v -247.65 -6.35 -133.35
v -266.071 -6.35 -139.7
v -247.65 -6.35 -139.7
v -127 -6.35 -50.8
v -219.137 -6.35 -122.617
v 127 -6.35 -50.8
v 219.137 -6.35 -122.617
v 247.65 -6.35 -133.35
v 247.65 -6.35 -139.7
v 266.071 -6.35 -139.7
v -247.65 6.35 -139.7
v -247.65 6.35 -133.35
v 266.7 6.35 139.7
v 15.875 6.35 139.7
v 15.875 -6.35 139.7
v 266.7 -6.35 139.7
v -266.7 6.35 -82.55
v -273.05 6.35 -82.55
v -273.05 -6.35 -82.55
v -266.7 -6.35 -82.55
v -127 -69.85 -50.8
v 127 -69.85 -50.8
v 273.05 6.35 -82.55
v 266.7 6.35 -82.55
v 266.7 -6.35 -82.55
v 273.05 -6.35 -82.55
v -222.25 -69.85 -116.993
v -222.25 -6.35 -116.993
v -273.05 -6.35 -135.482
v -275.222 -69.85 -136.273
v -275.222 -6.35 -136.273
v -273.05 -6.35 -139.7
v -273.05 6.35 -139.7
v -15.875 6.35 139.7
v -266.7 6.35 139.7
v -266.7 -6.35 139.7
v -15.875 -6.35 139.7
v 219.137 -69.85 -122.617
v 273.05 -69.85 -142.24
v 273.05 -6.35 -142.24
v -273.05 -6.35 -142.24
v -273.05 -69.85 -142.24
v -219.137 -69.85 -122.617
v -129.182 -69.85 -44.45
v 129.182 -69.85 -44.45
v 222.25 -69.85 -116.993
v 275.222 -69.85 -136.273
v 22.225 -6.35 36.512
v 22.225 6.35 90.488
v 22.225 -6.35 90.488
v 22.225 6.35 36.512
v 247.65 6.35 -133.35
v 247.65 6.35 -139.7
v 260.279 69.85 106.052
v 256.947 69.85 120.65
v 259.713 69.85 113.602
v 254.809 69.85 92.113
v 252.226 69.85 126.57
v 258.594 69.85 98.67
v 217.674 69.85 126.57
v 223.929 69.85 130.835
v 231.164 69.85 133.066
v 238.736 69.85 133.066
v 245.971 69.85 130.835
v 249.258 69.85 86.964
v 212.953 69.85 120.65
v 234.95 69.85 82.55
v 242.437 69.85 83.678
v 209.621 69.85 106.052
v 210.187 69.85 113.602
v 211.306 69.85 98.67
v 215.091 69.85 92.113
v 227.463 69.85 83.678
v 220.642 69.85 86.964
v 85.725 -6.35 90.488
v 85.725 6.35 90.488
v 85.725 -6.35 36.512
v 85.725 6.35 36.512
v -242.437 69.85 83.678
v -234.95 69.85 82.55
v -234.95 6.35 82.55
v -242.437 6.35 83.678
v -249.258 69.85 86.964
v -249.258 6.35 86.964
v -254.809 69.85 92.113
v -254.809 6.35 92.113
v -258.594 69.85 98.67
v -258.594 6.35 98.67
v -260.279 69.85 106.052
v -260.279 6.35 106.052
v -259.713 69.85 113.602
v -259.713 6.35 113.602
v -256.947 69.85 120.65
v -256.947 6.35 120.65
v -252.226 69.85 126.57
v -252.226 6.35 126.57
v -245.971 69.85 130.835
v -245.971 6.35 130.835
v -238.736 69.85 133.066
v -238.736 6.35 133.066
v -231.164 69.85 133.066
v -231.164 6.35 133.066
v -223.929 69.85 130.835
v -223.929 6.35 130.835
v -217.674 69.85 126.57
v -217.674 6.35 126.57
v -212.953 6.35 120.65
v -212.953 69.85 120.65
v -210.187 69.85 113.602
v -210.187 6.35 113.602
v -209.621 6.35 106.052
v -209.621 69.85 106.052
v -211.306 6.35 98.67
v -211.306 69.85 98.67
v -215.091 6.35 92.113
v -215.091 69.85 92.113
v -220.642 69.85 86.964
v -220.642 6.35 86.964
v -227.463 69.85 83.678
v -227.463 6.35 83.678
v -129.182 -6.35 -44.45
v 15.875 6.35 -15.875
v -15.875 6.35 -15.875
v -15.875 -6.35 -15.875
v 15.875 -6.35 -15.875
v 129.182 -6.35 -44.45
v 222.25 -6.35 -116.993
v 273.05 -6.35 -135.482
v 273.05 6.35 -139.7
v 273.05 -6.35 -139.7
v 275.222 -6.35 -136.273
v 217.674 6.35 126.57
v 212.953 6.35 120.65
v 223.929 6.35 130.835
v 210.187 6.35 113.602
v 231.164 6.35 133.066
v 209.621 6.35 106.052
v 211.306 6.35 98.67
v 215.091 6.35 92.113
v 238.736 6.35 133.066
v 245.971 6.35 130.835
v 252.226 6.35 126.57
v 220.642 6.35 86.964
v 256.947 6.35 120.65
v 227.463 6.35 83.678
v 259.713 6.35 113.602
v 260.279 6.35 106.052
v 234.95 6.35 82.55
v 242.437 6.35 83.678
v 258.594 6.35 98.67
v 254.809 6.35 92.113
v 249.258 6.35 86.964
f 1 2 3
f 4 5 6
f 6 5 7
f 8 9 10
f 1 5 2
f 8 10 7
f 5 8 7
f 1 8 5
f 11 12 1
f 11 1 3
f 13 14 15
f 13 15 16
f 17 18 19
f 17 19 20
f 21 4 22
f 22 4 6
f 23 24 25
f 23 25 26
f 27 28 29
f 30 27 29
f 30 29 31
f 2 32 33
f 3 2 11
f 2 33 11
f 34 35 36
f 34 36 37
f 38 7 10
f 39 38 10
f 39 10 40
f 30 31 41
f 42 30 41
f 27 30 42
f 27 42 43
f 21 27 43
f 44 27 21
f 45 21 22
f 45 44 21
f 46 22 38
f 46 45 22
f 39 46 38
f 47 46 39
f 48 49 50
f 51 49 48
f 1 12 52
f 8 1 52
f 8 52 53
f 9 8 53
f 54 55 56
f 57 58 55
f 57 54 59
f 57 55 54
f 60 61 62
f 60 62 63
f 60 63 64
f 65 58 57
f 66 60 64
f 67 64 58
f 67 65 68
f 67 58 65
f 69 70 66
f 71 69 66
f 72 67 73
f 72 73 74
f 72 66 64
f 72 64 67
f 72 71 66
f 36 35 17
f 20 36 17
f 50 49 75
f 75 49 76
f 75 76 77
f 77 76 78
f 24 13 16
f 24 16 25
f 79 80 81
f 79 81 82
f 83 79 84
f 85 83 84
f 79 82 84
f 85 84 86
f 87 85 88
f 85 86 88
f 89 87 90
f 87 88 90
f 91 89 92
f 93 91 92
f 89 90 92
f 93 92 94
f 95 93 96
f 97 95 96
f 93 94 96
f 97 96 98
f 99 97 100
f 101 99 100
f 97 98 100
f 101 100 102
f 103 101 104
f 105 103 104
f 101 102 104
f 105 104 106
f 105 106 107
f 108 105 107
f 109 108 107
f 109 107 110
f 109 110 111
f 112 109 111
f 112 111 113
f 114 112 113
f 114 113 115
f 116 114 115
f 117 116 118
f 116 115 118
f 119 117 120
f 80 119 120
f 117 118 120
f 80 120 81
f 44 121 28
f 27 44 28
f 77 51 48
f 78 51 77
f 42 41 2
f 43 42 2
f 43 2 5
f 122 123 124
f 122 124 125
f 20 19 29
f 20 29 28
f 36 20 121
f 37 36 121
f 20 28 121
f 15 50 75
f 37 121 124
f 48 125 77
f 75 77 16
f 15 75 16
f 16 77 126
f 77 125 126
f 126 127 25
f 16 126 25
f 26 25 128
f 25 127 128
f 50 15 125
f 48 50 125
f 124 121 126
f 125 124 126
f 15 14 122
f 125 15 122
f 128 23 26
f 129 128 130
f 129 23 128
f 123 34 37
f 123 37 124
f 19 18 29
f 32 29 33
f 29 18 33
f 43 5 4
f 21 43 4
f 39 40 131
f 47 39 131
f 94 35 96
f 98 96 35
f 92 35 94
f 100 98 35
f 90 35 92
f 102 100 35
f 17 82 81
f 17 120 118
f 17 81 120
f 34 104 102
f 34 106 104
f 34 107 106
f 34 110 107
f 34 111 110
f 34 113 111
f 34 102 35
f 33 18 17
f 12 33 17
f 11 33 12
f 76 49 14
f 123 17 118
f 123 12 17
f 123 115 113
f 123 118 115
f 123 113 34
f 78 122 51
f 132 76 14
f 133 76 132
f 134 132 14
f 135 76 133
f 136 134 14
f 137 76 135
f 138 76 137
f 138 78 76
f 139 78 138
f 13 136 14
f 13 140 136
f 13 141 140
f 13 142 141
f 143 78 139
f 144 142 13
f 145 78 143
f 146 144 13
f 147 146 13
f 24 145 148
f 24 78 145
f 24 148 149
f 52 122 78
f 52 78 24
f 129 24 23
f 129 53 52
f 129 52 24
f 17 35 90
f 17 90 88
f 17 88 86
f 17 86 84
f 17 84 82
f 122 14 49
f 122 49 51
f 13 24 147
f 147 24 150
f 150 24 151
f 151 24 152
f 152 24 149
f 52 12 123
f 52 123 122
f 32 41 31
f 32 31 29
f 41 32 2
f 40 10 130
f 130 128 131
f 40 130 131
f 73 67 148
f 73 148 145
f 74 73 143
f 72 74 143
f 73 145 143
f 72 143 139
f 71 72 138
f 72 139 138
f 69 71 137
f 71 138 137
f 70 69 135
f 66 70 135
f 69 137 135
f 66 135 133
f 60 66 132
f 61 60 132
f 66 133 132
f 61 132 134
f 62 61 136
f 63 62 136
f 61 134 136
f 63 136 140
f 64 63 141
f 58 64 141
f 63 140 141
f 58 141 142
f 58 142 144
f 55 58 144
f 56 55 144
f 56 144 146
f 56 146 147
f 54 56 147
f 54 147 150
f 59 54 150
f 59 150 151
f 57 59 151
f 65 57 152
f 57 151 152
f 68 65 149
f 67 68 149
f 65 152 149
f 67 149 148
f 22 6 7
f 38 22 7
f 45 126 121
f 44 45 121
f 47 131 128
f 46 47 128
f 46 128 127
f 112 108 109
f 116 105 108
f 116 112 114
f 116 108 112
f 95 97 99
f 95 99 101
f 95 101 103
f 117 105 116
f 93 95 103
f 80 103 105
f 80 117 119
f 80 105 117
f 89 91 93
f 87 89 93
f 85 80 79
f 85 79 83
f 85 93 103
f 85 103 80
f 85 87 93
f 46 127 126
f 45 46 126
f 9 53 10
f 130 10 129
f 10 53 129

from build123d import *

# Parameters (mm, degrees)
SKETCH1_W           = 546.1
SKETCH1_H           = 279.4
BOSS_EXTRUDE1_DEPTH = 6.35
SKETCH2_W           = 31.75
SKETCH2_H           = 155.575
SKETCH2_W_2         = 6.35
SKETCH2_H_2         = 222.25
SKETCH2_W_3         = 63.5
SKETCH2_H_3         = 53.975
SKETCH2_W_4         = 495.3
SKETCH2_H_4         = 6.35
CUT_EXTRUDE1_DEPTH  = 307.975051918
EXTRUDE2_DEPTH      = 63.5
SKETCH4_R           = 25.4
BOSS_EXTRUDE2_DEPTH = 63.5


with BuildPart() as part:
    # Sketch1 → Boss-Extrude1 (new, symmetric)
    with BuildSketch(Plane(origin=(0, 0, 0), x_dir=(1, 0, 0), z_dir=(0, 1, 0))):
        Rectangle(SKETCH1_W, SKETCH1_H)
    extrude(amount=BOSS_EXTRUDE1_DEPTH, both=True)

    # Sketch2 → Cut-Extrude1 (cut, through all)
    with BuildSketch(Plane(origin=(0, 6.35, 0), x_dir=(1, 0, 0), z_dir=(0, 1, 0))):
        with Locations((0, -61.9125)):
            Rectangle(SKETCH2_W, SKETCH2_H)
        with Locations((-269.875, -28.575)):
            Rectangle(SKETCH2_W_2, SKETCH2_H_2)
        with Locations((53.975, -63.5)):
            Rectangle(SKETCH2_W_3, SKETCH2_H_3)
        with Locations((0, 136.525)):
            Rectangle(SKETCH2_W_4, SKETCH2_H_4)
        with Locations((269.875, -28.575)):
            Rectangle(SKETCH2_W_2, SKETCH2_H_2)
    extrude(amount=-CUT_EXTRUDE1_DEPTH, mode=Mode.SUBTRACT)

    # Sketch3 → Extrude2 (add)
    with BuildSketch(Plane.XZ.offset(6.35)):
        Polygon((222.25, -116.992783244), (129.182460015, -44.45), (-129.182460015, -44.45), (-222.25, -116.992783244), (-275.22182791, -136.272951858), (-273.05, -142.24), (-219.136547039, -122.617107896), (-127, -50.8), (127, -50.8), (219.136547039, -122.617107896), (273.05, -142.24), (275.22182791, -136.272951858), align=None)
    extrude(amount=EXTRUDE2_DEPTH)

    # Sketch4 → Boss-Extrude2 (add)
    with BuildSketch(Plane(origin=(0, 6.35, 0), x_dir=(1, 0, 0), z_dir=(0, 1, 0))):
        with Locations(Location((234.95, -107.95, 0), (0, 0, 90))):
            Circle(SKETCH4_R)
        with Locations(Location((-234.95, -107.95, 0), (0, 0, 90))):
            Circle(SKETCH4_R)
    extrude(amount=BOSS_EXTRUDE2_DEPTH)


solid = part.part
